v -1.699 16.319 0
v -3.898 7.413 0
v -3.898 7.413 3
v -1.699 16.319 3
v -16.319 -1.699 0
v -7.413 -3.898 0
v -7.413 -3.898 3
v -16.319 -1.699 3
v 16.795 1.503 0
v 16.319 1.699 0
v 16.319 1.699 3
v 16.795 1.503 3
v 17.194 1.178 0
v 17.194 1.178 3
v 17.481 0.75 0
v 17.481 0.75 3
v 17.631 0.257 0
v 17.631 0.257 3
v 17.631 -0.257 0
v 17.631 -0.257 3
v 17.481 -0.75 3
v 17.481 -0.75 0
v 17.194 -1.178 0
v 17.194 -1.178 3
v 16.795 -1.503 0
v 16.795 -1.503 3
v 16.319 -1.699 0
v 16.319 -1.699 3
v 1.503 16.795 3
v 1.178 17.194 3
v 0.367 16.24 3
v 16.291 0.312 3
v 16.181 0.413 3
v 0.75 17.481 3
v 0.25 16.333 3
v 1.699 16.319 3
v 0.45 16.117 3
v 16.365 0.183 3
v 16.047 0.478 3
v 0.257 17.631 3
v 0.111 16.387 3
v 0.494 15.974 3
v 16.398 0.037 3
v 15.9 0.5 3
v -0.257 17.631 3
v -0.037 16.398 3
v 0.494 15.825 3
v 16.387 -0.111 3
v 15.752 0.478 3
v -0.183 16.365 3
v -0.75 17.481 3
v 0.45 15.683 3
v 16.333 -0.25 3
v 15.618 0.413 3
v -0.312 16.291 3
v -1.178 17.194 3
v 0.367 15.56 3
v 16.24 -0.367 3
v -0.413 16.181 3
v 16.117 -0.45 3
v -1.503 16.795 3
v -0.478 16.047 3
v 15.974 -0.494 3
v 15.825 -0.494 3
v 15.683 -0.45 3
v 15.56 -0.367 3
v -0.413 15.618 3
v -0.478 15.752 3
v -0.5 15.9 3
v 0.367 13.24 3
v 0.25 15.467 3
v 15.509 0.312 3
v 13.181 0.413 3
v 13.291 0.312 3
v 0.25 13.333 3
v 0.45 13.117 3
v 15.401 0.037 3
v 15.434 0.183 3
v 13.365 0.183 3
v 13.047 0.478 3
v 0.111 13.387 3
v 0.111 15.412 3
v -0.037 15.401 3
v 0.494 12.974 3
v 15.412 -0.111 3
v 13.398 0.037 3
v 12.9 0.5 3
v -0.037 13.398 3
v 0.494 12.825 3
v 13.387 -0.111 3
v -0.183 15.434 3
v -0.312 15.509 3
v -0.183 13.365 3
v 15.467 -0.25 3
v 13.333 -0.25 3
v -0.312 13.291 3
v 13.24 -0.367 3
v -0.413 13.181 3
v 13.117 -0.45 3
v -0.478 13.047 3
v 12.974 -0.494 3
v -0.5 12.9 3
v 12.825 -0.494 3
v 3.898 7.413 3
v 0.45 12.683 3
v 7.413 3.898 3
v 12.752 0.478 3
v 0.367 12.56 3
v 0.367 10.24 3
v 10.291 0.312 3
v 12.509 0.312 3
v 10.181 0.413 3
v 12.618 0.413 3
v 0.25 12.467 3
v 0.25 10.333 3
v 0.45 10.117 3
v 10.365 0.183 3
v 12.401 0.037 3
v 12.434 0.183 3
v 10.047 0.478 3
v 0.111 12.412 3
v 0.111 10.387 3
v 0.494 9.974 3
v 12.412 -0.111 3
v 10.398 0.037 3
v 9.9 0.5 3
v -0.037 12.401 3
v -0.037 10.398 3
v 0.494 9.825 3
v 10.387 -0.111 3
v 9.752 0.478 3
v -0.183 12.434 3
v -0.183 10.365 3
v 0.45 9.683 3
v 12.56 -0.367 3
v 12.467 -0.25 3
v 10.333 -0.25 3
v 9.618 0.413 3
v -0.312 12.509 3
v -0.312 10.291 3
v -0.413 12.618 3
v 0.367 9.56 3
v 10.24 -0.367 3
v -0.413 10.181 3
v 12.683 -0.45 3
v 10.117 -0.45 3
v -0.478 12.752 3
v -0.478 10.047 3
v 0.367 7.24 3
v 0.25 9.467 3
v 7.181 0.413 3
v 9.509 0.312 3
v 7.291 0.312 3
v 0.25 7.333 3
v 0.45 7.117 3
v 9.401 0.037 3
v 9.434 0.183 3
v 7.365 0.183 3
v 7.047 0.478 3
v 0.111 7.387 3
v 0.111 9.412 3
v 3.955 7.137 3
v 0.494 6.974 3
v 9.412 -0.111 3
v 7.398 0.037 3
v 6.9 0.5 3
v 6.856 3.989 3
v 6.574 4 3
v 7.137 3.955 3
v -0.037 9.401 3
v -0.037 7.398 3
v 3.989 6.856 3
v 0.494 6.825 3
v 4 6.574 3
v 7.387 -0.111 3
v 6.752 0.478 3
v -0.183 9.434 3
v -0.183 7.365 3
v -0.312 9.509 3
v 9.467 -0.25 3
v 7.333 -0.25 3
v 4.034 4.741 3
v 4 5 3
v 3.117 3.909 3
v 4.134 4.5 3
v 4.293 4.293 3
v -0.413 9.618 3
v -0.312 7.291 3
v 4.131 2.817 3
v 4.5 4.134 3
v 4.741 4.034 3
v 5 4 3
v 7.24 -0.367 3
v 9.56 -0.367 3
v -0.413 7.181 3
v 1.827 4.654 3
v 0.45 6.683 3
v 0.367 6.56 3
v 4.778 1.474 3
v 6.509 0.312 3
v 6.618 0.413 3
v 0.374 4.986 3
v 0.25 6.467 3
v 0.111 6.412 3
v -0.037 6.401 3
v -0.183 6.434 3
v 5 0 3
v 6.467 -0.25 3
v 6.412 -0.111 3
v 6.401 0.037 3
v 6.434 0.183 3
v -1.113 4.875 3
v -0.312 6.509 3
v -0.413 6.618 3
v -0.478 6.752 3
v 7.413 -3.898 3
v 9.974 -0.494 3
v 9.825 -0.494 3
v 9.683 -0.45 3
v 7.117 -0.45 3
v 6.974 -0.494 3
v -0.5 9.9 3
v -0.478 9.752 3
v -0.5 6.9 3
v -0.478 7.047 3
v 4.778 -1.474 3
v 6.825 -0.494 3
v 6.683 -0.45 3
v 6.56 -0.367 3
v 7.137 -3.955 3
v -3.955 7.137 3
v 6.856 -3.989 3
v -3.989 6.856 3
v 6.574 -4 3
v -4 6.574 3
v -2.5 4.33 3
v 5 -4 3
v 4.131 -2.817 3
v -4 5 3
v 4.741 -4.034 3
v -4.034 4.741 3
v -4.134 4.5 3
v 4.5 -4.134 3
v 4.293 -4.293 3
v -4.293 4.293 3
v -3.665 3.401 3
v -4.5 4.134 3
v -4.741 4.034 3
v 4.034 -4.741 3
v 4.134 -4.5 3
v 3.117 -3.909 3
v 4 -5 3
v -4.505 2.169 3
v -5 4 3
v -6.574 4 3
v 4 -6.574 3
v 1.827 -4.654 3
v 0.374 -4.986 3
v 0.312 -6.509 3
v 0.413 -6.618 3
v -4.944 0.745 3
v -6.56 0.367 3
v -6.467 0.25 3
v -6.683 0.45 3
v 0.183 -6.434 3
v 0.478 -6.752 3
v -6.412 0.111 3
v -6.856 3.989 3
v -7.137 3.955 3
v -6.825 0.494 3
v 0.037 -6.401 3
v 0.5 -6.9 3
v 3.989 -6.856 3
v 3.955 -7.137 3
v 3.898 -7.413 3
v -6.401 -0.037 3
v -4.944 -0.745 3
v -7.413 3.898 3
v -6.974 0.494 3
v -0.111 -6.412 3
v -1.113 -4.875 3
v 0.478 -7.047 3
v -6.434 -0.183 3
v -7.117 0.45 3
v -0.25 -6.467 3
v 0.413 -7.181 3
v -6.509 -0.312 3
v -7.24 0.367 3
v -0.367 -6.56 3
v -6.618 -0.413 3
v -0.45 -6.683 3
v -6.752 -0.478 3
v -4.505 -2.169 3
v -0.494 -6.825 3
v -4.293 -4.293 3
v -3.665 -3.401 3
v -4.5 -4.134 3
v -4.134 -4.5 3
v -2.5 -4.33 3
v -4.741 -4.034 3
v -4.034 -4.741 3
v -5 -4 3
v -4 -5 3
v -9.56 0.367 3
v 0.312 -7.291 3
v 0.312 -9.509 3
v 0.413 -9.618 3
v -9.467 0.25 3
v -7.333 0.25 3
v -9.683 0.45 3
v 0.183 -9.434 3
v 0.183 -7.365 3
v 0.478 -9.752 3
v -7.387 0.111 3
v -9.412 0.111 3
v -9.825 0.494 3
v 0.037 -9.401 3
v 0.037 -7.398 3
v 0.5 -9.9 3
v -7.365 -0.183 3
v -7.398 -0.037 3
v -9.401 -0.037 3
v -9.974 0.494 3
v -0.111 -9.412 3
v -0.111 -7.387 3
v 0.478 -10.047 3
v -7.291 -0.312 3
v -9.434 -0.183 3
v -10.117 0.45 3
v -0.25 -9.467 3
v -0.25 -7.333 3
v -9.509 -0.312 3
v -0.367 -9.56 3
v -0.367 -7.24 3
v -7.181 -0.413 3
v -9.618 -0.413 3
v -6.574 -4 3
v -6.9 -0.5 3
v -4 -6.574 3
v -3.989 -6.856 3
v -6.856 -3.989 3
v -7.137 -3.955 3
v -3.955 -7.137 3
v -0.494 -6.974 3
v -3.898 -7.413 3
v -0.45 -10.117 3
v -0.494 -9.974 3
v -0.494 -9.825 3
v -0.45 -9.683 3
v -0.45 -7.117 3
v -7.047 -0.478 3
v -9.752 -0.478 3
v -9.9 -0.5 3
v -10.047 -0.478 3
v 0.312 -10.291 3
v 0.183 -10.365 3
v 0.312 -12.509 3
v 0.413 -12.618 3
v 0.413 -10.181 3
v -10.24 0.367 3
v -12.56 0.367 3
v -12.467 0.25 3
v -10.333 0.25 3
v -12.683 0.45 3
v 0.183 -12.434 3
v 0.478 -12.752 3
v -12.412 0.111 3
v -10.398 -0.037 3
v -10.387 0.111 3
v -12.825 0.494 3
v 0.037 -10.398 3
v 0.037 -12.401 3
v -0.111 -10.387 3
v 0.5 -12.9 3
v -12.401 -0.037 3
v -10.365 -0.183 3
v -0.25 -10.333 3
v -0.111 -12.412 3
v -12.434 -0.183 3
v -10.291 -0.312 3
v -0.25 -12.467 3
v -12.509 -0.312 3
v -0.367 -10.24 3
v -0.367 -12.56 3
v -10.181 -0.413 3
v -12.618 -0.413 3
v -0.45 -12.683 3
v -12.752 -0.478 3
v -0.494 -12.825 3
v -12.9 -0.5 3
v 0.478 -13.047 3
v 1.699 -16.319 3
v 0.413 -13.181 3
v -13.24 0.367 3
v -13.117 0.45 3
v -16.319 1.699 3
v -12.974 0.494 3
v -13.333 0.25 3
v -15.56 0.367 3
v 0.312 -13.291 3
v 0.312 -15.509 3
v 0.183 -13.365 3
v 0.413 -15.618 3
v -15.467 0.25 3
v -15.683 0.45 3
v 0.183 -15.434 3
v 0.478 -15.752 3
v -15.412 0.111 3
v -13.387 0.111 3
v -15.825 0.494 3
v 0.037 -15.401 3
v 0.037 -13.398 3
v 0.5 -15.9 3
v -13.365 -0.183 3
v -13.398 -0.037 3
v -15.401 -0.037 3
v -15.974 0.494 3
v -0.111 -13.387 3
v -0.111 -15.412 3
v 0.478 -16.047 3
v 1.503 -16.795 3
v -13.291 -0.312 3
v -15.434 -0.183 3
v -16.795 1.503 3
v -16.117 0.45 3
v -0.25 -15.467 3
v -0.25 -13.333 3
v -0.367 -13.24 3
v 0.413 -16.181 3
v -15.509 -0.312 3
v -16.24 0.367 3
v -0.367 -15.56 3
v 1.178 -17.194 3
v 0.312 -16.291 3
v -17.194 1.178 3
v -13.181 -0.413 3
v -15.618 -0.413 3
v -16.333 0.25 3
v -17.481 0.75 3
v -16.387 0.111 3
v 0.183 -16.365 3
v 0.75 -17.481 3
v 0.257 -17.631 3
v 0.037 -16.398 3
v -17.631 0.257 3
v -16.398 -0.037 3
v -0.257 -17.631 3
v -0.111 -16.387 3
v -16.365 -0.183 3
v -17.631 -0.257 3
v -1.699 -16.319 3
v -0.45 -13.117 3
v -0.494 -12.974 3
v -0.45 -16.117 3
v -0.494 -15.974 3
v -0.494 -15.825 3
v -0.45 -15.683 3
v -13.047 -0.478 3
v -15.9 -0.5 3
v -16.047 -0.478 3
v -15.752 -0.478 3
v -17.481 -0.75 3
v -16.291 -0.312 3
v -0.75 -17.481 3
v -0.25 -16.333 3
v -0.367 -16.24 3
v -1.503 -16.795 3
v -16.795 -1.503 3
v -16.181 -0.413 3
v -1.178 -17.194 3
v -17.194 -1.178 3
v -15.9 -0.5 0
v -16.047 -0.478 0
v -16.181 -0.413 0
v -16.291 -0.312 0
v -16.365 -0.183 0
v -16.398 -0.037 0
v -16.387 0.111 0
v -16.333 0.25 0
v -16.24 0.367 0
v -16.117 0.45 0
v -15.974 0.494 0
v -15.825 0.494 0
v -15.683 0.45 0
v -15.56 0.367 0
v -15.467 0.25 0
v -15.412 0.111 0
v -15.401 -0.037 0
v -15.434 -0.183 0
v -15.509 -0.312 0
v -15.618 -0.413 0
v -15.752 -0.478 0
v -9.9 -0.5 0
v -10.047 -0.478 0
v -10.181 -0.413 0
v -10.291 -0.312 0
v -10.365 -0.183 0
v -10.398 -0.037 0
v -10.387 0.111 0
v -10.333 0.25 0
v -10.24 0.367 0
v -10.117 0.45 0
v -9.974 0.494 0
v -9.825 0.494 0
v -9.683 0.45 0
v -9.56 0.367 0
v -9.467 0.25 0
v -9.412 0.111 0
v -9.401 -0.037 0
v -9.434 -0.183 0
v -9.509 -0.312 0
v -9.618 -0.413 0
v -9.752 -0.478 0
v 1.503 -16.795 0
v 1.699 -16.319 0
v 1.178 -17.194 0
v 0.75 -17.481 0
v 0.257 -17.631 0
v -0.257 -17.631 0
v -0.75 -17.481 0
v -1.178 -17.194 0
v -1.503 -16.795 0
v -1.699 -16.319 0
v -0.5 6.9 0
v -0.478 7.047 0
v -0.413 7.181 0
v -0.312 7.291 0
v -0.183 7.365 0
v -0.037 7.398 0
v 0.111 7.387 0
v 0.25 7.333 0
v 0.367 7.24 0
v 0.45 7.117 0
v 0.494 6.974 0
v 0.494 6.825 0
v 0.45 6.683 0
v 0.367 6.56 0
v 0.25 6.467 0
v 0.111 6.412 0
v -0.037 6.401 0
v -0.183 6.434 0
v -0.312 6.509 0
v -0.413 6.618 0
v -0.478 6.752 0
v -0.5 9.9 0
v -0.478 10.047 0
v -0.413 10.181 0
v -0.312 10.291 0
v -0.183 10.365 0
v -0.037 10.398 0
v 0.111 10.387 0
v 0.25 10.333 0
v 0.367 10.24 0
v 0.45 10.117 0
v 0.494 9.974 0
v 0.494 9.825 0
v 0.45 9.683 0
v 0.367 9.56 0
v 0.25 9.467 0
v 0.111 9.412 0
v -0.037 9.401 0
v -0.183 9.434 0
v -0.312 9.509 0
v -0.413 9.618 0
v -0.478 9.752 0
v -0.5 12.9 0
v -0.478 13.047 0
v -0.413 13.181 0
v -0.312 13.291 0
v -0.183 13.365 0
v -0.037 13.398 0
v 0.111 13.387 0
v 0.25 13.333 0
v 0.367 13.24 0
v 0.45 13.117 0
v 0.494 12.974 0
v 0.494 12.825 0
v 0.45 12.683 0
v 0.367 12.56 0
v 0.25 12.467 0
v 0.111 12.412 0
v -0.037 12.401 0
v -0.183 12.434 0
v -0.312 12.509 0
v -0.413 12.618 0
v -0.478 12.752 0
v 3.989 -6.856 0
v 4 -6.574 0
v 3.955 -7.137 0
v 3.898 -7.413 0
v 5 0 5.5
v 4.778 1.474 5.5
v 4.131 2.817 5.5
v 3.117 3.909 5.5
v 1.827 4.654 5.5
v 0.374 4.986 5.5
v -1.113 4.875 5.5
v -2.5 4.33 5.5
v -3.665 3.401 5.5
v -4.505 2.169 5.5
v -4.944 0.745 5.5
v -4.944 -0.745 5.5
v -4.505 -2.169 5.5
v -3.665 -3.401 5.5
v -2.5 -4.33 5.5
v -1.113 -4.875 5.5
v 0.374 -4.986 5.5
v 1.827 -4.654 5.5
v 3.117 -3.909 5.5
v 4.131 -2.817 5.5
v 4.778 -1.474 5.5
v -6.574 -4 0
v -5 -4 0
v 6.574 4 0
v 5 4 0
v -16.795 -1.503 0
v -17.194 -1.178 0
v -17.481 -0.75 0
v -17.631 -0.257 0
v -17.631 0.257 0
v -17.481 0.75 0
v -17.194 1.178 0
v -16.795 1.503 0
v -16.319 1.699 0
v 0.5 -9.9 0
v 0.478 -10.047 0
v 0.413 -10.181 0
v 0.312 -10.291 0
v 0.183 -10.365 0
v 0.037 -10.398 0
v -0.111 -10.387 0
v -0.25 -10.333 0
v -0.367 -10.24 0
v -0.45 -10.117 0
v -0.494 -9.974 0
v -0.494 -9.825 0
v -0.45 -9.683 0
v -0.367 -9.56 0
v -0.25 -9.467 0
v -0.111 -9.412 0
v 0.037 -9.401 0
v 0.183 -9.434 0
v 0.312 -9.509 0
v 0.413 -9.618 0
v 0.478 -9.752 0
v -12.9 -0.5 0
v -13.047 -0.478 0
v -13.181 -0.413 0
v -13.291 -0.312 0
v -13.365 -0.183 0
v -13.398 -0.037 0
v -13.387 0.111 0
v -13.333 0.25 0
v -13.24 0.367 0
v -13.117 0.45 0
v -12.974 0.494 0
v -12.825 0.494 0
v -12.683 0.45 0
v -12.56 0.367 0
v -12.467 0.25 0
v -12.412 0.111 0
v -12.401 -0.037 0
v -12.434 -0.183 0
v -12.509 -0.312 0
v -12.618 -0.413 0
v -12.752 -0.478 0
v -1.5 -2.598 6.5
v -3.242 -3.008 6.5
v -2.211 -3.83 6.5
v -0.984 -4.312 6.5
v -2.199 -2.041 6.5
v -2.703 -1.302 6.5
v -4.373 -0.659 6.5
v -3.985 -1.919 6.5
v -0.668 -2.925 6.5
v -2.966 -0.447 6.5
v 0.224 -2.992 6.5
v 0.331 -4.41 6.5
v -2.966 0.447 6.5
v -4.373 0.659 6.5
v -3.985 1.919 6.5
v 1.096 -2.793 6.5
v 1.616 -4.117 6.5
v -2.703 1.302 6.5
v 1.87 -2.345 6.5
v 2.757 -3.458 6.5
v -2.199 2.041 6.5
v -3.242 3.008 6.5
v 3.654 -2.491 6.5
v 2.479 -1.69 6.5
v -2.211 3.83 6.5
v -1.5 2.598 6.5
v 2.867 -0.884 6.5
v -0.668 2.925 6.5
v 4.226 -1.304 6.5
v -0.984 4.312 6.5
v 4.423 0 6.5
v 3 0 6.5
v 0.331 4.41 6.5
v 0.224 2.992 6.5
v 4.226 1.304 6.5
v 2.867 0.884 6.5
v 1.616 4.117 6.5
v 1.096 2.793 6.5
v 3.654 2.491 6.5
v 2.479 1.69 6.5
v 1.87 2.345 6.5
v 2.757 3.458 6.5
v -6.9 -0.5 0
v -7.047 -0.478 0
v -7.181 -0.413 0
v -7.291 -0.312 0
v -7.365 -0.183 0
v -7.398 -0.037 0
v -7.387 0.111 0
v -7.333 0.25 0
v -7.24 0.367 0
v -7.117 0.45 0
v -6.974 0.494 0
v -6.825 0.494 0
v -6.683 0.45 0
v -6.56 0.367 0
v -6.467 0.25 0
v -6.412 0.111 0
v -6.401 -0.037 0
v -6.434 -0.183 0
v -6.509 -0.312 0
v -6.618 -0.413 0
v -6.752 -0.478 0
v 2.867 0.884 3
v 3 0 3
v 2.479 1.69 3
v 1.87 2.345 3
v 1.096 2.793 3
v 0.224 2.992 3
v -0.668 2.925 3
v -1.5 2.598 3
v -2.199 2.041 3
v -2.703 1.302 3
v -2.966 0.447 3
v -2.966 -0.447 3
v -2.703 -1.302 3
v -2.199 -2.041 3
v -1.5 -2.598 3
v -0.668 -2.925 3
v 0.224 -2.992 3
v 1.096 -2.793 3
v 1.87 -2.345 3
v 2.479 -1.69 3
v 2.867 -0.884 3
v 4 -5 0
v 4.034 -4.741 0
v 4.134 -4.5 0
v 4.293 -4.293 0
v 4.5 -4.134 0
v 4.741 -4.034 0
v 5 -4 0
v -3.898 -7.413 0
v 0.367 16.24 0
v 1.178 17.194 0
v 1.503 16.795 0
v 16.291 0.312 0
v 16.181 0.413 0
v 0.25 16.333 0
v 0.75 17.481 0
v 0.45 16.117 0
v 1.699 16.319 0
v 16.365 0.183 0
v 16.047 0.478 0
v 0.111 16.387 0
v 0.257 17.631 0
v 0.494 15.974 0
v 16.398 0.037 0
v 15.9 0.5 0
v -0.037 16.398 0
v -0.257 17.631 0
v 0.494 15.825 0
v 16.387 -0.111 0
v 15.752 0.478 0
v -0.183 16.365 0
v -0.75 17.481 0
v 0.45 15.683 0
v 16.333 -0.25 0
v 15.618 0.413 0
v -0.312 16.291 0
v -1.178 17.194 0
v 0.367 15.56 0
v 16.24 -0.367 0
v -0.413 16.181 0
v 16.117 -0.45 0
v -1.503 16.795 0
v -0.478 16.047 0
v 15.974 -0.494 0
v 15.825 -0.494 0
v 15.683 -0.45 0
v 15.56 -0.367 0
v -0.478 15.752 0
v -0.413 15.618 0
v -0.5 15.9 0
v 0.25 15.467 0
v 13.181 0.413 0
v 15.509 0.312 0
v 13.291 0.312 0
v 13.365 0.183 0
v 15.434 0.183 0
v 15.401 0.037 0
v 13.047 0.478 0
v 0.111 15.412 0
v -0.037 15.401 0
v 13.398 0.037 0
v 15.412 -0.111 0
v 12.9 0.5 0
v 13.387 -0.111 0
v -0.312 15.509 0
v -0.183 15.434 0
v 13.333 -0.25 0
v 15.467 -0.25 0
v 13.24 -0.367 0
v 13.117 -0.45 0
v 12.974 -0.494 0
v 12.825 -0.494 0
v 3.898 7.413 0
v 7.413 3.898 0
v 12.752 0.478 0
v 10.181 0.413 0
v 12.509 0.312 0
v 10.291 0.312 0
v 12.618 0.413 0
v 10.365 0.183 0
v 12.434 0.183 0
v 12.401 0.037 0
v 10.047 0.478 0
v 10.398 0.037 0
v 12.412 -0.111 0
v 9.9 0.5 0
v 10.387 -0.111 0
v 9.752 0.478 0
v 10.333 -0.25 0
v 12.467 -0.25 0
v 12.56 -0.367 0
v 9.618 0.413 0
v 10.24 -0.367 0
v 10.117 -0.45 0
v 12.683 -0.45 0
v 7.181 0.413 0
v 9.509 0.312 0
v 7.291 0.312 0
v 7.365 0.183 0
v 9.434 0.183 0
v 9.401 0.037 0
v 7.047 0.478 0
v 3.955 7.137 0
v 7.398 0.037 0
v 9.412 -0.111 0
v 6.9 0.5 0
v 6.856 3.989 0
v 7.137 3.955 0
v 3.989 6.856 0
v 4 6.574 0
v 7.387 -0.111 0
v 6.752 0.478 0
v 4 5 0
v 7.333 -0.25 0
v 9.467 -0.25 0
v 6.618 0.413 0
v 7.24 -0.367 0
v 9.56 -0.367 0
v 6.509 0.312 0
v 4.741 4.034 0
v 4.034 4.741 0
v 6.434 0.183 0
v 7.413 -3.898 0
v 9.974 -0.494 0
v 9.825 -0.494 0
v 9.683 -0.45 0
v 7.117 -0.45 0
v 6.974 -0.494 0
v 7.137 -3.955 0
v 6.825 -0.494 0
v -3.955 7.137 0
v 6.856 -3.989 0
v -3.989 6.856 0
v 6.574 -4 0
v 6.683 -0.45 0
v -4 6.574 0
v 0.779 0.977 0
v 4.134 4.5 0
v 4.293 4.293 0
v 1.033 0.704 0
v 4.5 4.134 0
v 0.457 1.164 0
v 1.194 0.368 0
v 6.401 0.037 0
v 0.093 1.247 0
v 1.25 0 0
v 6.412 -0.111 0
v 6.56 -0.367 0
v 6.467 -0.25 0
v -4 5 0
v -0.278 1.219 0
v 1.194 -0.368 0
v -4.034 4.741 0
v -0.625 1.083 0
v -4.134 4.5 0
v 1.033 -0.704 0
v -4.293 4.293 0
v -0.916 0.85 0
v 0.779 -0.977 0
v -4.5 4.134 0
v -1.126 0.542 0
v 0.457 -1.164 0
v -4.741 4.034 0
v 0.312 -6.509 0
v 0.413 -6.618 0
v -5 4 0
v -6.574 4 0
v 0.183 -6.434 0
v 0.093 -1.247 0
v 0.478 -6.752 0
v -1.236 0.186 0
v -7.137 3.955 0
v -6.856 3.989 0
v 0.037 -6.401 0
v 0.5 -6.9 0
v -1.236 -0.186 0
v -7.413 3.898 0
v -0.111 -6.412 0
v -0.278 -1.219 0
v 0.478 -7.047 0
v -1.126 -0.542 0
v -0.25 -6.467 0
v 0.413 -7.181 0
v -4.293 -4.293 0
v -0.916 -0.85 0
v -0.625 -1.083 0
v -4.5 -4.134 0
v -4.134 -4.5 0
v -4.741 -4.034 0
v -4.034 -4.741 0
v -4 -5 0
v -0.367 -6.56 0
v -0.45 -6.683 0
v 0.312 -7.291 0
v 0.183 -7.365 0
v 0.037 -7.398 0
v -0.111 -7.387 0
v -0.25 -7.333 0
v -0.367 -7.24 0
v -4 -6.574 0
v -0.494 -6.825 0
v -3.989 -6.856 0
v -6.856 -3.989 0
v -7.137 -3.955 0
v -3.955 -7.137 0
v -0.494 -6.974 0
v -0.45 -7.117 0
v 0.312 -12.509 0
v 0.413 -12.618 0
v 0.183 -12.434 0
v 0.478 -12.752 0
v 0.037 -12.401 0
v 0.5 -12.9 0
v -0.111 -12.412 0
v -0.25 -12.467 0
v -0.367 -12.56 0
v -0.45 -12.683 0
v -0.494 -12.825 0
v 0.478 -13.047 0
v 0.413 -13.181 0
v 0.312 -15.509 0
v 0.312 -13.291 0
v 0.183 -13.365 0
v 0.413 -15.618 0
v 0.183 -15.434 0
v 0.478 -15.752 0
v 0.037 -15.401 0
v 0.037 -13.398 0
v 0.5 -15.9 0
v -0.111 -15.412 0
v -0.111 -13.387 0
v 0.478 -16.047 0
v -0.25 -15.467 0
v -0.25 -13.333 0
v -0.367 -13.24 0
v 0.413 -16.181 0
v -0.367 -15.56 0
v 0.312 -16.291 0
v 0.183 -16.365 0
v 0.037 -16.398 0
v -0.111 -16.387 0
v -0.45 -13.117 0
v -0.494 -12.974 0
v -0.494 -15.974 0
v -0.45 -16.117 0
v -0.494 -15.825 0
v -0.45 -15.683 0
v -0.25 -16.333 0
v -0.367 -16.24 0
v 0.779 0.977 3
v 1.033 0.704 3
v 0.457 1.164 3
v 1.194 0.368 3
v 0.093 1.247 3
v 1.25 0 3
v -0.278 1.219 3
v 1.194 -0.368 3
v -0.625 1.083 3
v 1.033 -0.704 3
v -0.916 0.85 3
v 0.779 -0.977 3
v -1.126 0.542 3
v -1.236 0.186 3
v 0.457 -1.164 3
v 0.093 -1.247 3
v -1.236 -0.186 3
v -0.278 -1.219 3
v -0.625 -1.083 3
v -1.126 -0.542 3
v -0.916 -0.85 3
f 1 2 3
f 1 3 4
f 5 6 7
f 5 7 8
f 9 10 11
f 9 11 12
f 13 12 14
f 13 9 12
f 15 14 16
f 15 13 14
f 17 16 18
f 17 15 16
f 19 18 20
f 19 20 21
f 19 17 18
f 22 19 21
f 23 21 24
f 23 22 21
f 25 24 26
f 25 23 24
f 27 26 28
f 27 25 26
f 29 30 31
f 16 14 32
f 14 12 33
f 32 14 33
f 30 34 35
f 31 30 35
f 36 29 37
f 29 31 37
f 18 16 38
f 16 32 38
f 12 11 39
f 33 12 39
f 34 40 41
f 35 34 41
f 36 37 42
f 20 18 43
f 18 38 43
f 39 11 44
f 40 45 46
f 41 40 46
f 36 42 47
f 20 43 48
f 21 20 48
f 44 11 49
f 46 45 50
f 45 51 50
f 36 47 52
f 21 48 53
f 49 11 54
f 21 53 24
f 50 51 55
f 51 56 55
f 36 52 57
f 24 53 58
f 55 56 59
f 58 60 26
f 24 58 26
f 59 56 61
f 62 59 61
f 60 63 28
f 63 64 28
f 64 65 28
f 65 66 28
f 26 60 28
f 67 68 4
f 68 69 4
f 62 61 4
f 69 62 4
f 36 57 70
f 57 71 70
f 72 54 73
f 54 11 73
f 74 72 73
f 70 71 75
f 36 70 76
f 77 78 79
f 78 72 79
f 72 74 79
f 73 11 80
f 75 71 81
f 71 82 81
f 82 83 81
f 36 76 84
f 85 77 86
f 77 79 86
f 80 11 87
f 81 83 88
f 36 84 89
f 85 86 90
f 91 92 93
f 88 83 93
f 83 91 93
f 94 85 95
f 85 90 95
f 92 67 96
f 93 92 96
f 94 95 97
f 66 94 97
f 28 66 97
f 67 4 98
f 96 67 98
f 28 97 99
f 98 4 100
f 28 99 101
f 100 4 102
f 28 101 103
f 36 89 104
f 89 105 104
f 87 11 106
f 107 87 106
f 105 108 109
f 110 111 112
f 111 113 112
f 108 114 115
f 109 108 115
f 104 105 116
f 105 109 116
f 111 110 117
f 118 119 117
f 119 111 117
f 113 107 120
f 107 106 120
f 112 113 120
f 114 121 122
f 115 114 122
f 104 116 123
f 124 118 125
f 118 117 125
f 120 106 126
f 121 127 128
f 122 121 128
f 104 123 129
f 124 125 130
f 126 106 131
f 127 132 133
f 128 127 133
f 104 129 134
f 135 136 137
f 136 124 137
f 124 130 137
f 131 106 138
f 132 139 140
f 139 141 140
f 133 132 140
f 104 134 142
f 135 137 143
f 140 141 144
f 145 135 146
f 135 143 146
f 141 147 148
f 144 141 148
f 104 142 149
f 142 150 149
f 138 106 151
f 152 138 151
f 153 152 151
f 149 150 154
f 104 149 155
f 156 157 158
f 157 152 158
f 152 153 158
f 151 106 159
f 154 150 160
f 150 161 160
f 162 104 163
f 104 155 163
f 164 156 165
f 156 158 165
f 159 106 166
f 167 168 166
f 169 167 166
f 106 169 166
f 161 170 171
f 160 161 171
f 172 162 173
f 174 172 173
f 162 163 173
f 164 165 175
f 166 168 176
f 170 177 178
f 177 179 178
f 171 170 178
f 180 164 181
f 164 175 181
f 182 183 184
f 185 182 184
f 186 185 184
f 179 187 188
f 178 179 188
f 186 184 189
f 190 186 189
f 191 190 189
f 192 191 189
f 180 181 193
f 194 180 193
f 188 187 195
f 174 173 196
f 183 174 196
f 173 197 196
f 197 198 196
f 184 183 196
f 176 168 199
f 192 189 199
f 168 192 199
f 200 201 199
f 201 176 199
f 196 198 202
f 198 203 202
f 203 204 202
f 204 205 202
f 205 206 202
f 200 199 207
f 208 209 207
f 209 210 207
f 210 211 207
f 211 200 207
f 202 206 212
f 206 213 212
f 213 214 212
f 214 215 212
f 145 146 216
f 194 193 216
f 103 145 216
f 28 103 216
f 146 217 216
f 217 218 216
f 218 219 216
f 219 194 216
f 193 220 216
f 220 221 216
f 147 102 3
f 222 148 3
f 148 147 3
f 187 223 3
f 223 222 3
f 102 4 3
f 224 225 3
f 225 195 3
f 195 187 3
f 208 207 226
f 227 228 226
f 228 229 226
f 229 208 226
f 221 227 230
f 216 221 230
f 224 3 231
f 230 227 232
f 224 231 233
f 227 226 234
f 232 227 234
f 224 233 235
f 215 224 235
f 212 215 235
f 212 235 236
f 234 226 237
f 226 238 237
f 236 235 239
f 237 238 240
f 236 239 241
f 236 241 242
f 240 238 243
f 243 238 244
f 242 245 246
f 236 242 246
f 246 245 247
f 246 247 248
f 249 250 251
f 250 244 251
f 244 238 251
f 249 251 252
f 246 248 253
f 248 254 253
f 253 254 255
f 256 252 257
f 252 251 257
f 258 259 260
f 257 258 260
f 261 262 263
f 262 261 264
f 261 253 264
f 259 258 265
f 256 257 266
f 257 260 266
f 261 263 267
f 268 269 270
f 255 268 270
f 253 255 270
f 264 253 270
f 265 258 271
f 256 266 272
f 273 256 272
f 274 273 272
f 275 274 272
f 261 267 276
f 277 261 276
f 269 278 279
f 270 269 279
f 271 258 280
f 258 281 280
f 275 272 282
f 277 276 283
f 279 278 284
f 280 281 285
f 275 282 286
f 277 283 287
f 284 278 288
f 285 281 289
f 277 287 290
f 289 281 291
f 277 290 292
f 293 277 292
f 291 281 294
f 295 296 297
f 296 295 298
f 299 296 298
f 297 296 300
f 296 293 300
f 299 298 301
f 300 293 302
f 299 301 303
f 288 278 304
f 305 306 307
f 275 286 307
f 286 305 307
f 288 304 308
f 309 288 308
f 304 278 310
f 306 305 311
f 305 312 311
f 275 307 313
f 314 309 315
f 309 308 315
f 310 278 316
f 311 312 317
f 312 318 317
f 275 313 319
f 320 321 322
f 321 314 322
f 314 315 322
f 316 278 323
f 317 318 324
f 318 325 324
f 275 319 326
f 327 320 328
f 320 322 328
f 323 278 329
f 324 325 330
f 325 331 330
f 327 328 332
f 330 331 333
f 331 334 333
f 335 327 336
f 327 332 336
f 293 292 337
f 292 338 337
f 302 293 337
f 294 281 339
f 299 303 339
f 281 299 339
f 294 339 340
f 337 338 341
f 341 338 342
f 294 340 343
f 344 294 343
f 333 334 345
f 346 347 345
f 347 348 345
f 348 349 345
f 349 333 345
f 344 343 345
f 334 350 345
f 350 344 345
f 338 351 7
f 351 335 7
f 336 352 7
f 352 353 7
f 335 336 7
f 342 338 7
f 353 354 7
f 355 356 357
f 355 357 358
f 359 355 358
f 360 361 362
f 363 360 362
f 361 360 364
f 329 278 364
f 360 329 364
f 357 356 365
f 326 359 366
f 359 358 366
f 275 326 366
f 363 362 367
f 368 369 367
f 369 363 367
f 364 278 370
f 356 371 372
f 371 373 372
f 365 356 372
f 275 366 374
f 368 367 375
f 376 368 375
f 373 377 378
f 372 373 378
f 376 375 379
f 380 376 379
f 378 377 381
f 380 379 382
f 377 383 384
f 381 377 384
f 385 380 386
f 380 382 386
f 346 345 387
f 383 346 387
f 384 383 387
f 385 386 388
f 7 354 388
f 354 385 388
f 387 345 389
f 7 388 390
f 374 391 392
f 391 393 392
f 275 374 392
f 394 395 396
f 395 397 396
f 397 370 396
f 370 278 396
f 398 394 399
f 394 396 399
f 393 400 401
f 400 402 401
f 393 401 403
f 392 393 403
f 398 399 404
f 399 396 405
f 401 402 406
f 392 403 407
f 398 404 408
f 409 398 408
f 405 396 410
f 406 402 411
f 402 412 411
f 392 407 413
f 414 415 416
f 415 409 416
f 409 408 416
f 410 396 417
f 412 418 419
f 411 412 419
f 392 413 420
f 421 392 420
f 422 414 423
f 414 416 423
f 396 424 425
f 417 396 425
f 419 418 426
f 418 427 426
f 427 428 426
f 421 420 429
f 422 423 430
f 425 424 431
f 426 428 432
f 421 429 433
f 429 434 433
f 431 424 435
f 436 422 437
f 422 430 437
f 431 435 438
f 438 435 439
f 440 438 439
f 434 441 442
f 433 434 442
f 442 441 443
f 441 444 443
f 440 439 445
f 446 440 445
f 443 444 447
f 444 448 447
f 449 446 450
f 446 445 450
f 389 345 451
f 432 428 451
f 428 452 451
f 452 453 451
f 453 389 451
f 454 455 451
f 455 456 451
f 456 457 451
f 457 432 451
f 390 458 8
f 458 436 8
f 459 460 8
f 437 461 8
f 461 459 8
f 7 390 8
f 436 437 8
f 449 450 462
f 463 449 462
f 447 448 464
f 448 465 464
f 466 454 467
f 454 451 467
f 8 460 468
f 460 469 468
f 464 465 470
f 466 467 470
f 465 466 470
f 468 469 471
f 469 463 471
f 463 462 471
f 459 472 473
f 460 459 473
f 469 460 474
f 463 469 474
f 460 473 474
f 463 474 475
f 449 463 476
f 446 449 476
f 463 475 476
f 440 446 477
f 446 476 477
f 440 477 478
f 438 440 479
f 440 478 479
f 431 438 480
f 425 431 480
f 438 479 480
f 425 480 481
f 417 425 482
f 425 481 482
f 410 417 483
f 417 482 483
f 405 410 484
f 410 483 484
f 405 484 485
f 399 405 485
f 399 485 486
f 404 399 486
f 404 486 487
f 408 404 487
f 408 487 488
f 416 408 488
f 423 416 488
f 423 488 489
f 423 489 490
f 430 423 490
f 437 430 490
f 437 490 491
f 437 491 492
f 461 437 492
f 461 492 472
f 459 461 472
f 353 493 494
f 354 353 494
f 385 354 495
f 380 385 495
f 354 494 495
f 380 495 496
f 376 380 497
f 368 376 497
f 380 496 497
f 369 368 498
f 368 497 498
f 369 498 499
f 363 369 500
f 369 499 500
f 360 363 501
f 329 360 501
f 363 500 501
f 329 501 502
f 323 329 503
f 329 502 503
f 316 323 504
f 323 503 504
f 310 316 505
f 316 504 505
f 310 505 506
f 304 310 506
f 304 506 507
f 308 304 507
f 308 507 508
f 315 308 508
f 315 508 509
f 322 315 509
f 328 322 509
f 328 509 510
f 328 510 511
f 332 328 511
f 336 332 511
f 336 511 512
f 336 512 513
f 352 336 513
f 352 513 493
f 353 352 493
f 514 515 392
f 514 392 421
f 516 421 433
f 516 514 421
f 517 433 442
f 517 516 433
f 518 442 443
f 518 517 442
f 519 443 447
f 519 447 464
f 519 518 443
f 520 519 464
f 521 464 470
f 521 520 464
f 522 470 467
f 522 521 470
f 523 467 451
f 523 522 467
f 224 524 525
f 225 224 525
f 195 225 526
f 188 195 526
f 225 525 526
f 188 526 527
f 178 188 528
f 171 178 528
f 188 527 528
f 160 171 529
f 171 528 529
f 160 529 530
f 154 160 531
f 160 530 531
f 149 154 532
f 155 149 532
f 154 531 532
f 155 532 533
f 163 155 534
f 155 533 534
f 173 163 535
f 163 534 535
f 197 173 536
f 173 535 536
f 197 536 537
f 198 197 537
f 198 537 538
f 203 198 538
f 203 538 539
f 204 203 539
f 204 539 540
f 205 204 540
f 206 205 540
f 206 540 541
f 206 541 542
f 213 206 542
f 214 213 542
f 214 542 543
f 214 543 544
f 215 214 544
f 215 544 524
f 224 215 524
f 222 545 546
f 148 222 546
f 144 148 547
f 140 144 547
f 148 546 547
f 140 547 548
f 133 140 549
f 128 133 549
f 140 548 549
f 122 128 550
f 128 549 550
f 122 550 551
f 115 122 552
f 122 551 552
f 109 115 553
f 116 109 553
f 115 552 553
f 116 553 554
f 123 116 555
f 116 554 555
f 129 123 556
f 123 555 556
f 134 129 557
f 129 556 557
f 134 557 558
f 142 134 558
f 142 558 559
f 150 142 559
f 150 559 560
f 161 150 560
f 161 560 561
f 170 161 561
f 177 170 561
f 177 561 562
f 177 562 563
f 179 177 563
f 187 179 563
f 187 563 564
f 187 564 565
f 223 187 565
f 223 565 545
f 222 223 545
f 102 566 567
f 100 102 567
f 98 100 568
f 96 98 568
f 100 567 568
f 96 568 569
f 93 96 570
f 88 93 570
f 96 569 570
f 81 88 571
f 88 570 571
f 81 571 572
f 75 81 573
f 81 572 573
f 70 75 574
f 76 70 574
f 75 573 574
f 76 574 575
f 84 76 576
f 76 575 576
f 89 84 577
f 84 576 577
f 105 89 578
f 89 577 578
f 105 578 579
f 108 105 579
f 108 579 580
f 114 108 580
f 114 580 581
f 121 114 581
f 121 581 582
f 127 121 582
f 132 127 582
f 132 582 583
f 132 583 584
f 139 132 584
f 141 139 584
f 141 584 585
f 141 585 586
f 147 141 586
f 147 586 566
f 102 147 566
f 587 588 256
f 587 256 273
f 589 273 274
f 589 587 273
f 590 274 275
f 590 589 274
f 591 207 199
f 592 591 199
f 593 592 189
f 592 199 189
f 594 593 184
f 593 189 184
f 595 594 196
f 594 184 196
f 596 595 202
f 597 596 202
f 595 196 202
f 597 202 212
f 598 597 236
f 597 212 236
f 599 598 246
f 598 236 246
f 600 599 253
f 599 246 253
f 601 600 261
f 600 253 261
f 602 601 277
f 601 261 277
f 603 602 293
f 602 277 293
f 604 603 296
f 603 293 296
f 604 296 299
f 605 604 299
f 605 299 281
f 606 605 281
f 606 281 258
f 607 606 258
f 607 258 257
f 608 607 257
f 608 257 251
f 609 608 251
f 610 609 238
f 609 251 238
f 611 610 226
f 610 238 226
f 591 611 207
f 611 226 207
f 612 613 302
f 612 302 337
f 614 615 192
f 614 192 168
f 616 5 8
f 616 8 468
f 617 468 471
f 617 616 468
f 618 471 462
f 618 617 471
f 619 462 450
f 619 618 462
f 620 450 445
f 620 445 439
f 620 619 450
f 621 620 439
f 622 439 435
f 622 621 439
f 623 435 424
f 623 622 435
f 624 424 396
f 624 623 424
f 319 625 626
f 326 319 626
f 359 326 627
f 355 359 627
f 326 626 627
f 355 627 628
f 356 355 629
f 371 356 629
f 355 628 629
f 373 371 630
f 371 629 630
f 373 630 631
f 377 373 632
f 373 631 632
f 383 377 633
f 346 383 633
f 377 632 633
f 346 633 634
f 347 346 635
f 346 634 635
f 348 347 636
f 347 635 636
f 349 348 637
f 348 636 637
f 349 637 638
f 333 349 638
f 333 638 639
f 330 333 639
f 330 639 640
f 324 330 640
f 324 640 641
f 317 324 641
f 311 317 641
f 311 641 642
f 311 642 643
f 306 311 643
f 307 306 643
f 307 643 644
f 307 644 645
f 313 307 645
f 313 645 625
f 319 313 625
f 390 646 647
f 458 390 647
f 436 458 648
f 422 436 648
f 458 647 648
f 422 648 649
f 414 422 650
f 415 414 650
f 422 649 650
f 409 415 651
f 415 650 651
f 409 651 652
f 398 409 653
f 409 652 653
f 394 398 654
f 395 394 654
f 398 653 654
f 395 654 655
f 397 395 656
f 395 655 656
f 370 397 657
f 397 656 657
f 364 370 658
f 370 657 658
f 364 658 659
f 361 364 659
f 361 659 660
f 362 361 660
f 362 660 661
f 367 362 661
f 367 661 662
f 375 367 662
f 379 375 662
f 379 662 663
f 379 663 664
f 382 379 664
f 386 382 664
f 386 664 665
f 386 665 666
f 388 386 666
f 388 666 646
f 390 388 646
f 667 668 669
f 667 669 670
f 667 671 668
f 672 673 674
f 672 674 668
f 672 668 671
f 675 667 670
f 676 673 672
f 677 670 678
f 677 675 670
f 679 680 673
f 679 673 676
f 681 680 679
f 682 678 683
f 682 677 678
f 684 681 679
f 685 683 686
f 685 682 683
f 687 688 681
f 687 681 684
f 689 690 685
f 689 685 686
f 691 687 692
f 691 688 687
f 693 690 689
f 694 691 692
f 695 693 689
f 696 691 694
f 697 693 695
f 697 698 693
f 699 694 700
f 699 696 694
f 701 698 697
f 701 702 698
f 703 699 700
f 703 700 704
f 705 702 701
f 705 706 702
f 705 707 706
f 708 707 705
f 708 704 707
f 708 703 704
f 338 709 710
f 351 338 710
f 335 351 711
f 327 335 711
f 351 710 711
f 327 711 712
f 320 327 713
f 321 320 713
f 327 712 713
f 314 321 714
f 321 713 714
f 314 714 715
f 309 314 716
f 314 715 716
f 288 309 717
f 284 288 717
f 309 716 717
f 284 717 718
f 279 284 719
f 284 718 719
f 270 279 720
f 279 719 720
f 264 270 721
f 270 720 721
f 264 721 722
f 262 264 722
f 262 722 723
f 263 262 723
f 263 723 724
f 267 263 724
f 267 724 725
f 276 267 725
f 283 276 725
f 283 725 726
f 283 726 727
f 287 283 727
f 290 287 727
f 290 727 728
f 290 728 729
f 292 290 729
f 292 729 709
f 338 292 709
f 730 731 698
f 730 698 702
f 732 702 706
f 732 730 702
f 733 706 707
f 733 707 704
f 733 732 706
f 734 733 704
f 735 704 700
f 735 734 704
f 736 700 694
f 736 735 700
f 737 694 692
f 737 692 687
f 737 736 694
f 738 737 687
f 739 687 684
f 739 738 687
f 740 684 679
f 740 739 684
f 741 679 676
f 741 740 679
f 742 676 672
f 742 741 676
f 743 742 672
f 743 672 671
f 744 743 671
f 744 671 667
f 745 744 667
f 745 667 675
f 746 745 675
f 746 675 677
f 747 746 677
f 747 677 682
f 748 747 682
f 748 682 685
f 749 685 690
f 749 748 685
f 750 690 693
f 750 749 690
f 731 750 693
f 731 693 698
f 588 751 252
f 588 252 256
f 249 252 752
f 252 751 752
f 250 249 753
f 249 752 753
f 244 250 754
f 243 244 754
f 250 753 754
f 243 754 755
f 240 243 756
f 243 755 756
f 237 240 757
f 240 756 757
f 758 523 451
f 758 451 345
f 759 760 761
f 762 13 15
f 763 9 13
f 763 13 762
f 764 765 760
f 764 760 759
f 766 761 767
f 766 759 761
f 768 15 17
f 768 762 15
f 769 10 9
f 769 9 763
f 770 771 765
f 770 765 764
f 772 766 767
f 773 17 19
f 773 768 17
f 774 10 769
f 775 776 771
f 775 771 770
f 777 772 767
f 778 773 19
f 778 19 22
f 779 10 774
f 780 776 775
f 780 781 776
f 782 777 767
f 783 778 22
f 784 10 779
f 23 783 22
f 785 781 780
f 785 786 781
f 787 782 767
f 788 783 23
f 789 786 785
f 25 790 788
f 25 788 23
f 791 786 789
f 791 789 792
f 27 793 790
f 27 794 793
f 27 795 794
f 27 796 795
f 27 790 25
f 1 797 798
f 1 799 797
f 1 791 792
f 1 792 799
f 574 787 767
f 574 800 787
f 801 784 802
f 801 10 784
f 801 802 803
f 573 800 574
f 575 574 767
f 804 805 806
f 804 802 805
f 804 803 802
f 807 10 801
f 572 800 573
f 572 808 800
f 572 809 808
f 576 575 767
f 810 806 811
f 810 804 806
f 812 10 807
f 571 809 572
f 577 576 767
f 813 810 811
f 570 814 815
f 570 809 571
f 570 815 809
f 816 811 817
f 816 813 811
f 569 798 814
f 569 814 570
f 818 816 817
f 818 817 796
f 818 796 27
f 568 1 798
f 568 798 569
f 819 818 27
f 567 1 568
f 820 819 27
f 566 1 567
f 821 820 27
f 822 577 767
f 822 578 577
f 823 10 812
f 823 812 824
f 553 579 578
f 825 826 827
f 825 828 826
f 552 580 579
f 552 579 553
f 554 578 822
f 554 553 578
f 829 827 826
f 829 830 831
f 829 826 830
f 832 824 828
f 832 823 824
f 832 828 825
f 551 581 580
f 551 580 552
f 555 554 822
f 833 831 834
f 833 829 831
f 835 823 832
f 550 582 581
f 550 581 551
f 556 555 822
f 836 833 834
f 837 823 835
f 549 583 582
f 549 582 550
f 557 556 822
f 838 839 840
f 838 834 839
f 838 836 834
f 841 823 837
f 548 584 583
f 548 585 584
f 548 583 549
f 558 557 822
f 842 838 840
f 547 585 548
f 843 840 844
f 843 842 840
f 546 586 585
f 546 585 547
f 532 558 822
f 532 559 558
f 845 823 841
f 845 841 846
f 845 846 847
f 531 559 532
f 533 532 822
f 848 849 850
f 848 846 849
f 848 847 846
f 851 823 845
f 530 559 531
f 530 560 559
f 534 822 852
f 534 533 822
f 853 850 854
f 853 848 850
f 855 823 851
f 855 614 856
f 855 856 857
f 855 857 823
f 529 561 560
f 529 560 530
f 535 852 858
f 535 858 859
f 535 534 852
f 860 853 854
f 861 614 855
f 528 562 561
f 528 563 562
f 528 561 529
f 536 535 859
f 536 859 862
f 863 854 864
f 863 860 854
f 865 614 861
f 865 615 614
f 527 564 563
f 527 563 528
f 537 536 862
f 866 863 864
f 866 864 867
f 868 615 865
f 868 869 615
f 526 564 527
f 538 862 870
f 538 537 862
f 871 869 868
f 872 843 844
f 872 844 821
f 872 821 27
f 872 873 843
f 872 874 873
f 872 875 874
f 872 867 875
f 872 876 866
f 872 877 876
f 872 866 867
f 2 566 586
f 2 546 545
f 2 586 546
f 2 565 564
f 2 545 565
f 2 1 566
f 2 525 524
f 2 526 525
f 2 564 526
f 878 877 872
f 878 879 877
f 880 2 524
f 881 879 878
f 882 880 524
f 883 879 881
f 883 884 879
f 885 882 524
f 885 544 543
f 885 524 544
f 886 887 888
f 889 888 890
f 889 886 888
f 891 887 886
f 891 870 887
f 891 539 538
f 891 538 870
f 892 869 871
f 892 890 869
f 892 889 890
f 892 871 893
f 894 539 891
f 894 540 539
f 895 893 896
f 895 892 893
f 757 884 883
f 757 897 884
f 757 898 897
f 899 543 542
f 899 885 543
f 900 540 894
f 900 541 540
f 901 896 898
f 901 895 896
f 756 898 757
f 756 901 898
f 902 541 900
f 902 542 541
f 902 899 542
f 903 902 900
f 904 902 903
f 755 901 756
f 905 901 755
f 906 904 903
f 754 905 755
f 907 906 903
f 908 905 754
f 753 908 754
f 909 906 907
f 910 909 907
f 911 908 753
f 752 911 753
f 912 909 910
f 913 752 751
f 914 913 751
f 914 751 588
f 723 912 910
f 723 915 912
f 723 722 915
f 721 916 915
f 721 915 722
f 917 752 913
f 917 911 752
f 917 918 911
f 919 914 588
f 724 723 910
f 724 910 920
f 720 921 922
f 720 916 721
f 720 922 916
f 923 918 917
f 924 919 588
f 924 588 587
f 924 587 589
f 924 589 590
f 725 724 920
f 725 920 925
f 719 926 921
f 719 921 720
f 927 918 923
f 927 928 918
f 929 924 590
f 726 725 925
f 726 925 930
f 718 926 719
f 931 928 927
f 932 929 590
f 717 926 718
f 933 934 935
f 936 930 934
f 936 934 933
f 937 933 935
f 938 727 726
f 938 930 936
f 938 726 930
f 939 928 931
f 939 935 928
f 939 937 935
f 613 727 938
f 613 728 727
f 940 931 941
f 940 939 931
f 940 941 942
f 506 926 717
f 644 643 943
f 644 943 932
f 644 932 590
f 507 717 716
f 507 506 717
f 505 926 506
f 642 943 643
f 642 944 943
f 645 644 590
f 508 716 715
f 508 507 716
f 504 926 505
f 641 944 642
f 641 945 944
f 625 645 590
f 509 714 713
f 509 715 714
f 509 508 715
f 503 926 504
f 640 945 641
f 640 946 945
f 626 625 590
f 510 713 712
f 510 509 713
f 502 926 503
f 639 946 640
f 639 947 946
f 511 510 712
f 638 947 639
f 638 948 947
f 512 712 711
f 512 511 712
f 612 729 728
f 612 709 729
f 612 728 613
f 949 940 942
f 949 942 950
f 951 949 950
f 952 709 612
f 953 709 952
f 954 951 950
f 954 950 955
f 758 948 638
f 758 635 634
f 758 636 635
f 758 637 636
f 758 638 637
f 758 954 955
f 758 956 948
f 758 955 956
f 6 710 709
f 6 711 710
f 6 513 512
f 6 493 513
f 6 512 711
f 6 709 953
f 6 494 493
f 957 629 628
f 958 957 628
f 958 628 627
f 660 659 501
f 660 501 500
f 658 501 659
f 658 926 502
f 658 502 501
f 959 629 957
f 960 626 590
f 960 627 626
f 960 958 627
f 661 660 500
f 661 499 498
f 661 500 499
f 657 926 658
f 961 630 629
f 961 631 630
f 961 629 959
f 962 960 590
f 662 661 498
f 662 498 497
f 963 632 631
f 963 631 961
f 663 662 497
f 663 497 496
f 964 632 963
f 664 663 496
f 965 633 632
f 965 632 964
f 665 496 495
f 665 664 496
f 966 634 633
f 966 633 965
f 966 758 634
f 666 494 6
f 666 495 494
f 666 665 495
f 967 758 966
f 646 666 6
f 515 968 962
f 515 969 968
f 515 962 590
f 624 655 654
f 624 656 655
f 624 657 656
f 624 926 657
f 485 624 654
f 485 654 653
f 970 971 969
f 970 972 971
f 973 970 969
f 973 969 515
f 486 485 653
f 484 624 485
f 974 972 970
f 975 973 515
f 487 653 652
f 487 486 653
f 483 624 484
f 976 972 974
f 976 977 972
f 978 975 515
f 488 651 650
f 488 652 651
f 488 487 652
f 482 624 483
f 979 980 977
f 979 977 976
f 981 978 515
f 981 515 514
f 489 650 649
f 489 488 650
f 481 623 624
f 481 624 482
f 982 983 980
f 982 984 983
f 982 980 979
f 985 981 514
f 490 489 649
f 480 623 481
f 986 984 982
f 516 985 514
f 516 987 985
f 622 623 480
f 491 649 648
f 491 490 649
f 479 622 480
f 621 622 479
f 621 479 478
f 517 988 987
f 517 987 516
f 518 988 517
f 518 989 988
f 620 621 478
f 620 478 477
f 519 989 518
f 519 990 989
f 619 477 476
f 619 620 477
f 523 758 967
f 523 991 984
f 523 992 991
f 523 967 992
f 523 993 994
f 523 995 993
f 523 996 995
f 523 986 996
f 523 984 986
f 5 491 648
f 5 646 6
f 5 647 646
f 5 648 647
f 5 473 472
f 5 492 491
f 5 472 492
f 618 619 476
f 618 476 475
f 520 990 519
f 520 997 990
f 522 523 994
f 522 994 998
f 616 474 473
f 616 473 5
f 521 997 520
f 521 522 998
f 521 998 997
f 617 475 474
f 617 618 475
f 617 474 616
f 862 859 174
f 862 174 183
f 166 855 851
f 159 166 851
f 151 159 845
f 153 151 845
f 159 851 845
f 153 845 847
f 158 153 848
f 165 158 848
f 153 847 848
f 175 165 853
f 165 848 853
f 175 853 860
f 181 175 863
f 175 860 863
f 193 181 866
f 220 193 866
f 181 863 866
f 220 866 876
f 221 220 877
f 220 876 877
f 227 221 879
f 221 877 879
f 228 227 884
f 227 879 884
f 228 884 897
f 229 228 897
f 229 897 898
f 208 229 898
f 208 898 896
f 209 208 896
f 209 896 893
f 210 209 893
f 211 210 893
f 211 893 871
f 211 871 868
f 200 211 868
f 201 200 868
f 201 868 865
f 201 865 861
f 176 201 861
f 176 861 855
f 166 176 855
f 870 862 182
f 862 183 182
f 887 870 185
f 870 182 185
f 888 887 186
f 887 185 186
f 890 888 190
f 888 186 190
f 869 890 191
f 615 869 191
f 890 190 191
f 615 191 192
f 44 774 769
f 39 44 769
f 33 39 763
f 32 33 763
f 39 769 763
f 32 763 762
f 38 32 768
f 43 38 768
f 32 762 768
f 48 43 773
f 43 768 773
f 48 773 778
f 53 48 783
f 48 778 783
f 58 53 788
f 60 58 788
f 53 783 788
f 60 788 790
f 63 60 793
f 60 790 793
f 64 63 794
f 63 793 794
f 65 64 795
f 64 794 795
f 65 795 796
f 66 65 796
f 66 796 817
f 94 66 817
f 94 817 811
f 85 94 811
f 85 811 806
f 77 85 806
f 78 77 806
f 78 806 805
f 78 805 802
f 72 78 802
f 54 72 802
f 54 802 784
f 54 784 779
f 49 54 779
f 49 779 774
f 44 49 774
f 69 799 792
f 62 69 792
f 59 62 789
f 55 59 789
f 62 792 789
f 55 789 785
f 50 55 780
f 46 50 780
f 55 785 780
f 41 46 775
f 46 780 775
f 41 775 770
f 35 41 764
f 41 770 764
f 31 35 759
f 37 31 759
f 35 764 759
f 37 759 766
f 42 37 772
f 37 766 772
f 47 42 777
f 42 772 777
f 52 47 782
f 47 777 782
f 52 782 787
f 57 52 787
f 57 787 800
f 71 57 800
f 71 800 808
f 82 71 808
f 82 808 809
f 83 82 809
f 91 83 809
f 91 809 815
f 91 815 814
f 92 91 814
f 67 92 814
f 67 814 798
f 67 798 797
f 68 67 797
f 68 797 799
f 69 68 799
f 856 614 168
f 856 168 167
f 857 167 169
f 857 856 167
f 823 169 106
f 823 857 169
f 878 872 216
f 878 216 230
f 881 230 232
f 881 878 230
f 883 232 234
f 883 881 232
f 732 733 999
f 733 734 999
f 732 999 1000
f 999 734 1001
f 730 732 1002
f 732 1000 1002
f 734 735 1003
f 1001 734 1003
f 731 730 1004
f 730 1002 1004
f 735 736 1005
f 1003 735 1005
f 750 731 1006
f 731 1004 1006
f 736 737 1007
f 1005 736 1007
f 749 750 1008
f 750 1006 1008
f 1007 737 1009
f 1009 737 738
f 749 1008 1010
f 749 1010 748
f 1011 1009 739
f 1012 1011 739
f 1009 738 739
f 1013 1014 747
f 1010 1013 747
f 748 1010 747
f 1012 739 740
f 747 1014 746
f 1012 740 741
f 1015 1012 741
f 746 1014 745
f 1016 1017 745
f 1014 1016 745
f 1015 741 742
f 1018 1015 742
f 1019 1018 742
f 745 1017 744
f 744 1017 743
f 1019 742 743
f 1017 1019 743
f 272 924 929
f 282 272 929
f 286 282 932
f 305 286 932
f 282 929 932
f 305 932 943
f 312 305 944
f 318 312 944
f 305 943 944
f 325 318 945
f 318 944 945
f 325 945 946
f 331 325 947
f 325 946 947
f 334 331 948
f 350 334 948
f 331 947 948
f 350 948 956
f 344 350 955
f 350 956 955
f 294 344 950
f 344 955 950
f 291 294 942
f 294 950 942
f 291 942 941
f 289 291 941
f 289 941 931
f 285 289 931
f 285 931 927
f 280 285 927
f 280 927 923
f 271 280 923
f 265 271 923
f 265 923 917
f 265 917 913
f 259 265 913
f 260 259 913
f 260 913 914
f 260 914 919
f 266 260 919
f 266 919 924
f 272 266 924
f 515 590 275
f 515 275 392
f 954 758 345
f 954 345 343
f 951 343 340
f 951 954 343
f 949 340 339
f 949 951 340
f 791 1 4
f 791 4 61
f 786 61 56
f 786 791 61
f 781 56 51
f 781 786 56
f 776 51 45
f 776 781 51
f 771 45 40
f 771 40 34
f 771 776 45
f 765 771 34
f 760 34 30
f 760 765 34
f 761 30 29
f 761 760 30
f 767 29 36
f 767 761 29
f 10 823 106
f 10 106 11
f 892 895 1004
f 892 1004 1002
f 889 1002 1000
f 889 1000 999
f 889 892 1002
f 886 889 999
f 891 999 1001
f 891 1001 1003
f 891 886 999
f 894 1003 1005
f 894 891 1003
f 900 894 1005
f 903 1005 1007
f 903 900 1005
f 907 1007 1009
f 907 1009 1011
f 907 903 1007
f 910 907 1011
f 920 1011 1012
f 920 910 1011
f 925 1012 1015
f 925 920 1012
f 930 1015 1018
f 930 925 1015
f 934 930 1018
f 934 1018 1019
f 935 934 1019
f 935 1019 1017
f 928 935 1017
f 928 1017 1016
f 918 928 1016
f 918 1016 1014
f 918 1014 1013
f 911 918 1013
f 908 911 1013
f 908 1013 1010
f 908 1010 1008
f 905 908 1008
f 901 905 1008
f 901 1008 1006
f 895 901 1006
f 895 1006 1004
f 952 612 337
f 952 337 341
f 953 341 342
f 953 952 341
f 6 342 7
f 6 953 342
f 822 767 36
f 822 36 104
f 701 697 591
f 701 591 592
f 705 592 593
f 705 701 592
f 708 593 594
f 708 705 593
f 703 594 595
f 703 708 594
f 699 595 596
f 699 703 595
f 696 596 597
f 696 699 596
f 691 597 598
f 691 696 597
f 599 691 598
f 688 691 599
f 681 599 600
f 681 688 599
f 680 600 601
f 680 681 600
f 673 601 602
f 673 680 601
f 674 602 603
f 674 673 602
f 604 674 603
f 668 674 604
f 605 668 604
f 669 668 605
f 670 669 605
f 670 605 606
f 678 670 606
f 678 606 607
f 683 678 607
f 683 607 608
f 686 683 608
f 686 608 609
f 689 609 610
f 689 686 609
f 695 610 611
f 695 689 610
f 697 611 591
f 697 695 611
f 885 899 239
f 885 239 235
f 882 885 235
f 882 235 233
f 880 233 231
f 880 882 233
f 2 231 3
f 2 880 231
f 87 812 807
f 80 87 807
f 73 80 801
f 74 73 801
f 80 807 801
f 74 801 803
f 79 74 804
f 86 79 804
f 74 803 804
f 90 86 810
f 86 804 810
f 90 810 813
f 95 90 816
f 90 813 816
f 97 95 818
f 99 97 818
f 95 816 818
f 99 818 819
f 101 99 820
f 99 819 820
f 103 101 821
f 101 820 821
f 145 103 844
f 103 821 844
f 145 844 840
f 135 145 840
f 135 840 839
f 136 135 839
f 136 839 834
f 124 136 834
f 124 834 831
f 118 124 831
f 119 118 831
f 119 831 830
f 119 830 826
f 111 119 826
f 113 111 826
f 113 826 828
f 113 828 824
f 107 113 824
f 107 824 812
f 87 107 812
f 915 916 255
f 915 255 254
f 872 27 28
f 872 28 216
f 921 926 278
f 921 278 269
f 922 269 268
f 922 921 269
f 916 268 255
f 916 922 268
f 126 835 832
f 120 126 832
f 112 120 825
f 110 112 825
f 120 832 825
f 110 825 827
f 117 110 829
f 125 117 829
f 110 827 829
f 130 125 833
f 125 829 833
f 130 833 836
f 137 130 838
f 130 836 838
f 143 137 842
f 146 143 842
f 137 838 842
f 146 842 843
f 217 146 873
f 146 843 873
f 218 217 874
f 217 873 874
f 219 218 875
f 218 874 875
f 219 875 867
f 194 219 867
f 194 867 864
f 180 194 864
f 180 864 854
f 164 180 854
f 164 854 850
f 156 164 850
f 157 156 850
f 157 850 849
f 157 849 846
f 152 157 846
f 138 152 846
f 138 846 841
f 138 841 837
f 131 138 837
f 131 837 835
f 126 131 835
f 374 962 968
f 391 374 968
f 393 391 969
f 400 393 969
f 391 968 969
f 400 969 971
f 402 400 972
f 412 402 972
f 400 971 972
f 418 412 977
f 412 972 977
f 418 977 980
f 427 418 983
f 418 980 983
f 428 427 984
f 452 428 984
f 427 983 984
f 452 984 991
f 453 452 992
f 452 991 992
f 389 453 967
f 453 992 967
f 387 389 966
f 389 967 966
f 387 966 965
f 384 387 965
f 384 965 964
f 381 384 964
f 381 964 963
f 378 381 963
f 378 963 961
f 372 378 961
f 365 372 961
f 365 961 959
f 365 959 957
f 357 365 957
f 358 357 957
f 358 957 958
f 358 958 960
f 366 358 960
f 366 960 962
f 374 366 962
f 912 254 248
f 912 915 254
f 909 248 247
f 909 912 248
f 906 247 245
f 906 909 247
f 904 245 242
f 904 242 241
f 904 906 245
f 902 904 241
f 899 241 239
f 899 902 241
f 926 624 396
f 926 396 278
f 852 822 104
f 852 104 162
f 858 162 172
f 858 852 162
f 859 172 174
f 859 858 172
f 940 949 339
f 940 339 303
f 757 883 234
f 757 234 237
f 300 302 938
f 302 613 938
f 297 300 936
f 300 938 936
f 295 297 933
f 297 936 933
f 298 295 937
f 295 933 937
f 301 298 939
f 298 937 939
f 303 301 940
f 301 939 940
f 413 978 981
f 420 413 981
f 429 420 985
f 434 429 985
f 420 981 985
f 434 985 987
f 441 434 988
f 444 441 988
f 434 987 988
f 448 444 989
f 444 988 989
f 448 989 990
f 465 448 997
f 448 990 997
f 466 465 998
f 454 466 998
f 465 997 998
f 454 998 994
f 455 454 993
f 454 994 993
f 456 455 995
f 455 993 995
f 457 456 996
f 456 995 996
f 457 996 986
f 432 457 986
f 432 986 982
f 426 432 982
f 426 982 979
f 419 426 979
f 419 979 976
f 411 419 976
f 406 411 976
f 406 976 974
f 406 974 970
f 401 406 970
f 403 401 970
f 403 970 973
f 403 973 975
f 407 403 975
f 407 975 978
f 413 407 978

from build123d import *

# Parameters (mm, degrees)
BOSS_EXTRUDE1_DEPTH   = 3
F_1_0MM_DOWEL_HOLE1_D = 1
LPATTERN1_COUNT       = 4
LPATTERN1_PITCH       = 3
CIRPATTERN1_COUNT     = 4
CIRPATTERN1_COPY_1_D  = 1
CIRPATTERN1_COPY_2_D  = 1
CIRPATTERN1_COPY_3_D  = 1
CIRPATTERN1_COPY_4_D  = 1
CIRPATTERN1_COPY_5_D  = 1
CIRPATTERN1_COPY_6_D  = 1
CIRPATTERN1_COPY_7_D  = 1
CIRPATTERN1_COPY_8_D  = 1
CIRPATTERN1_COPY_9_D  = 1
SKETCH6_R             = 5
SKETCH6_R_2           = 3
BOSS_EXTRUDE2_DEPTH   = 3.5
CHAMFER1_SIZE         = 1
CHAMFER1_SIZE2        = 0.577350269
FILLET1_R             = 1


with BuildPart() as part:
    # Sketch1 → Boss-Extrude1 (new body)
    with BuildSketch(Plane.XY):
        with BuildLine():
            Line((-4, 0), (-4, 6.574293681))
            ThreePointArc((-4, 6.574293681), (-3.974394349, 6.996885575), (-3.897952052, 7.413294188))
            Line((-3.897952052, 7.413294188), (-1.698976026, 16.319147094))
            ThreePointArc((-1.698976026, 16.319147094), (0, 17.649646841), (1.698976026, 16.319147094))
            Line((1.698976026, 16.319147094), (3.897952052, 7.413294188))
            ThreePointArc((3.897952052, 7.413294188), (3.974394349, 6.996885575), (4, 6.574293681))
            Line((4, 6.574293681), (4, 0))
            Line((4, 0), (1.25, 0))
            ThreePointArc((1.25, 0), (0, 1.25), (-1.25, 0))
            Line((-1.25, 0), (-4, 0))
        make_face()
    boss_extrude1 = extrude(amount=BOSS_EXTRUDE1_DEPTH)

    # Ø1.0mm Dowel Hole1 (through all)
    with Locations(Plane.XY.offset(3)):
        with Locations((0, 15.899646841)):
            f_1_0mm_dowel_hole1 = Hole(F_1_0MM_DOWEL_HOLE1_D / 2)

    # LPattern1: Ø1.0mm Dowel Hole1 ×4
    with Locations(*[(0, -i * LPATTERN1_PITCH, 0) for i in range(1, LPATTERN1_COUNT)]):
        add(f_1_0mm_dowel_hole1, mode=Mode.SUBTRACT)

    # CirPattern1: Boss-Extrude1, Ø1.0mm Dowel Hole1 ×4 about axis
    cirpattern1_axis = Axis((0, 0, 0), (0, 0, 1))
    add([boss_extrude1.rotate(cirpattern1_axis, i * 360 / CIRPATTERN1_COUNT) for i in range(1, CIRPATTERN1_COUNT)])
    add([f_1_0mm_dowel_hole1.rotate(cirpattern1_axis, i * 360 / CIRPATTERN1_COUNT) for i in range(1, CIRPATTERN1_COUNT)], mode=Mode.SUBTRACT)

    # CirPattern1 copy 1 (through all)
    with Locations(Plane(origin=(3, 0, 3), x_dir=(0, 1, 0), z_dir=(0, 0, 1))):
        with Locations((0, 15.899646841)):
            Hole(CIRPATTERN1_COPY_1_D / 2)

    # CirPattern1 copy 2 (through all)
    with Locations(Plane(origin=(0, 3, 3), x_dir=(-1, 0, 0), z_dir=(0, 0, 1))):
        with Locations((0, 15.899646841)):
            Hole(CIRPATTERN1_COPY_2_D / 2)

    # CirPattern1 copy 3 (through all)
    with Locations(Plane(origin=(-3, 0, 3), x_dir=(0, -1, 0), z_dir=(0, 0, 1))):
        with Locations((0, 15.899646841)):
            Hole(CIRPATTERN1_COPY_3_D / 2)

    # CirPattern1 copy 4 (through all)
    with Locations(Plane(origin=(6, 0, 3), x_dir=(0, 1, 0), z_dir=(0, 0, 1))):
        with Locations((0, 15.899646841)):
            Hole(CIRPATTERN1_COPY_4_D / 2)

    # CirPattern1 copy 5 (through all)
    with Locations(Plane(origin=(0, 6, 3), x_dir=(-1, 0, 0), z_dir=(0, 0, 1))):
        with Locations((0, 15.899646841)):
            Hole(CIRPATTERN1_COPY_5_D / 2)

    # CirPattern1 copy 6 (through all)
    with Locations(Plane(origin=(-6, 0, 3), x_dir=(0, -1, 0), z_dir=(0, 0, 1))):
        with Locations((0, 15.899646841)):
            Hole(CIRPATTERN1_COPY_6_D / 2)

    # CirPattern1 copy 7 (through all)
    with Locations(Plane(origin=(9, 0, 3), x_dir=(0, 1, 0), z_dir=(0, 0, 1))):
        with Locations((0, 15.899646841)):
            Hole(CIRPATTERN1_COPY_7_D / 2)

    # CirPattern1 copy 8 (through all)
    with Locations(Plane(origin=(0, 9, 3), x_dir=(-1, 0, 0), z_dir=(0, 0, 1))):
        with Locations((0, 15.899646841)):
            Hole(CIRPATTERN1_COPY_8_D / 2)

    # CirPattern1 copy 9 (through all)
    with Locations(Plane(origin=(-9, 0, 3), x_dir=(0, -1, 0), z_dir=(0, 0, 1))):
        with Locations((0, 15.899646841)):
            Hole(CIRPATTERN1_COPY_9_D / 2)

    # Sketch6 → Boss-Extrude2 (add)
    with BuildSketch(Plane.XY.offset(3)):
        Circle(SKETCH6_R)
        Circle(SKETCH6_R_2, mode=Mode.SUBTRACT)
    extrude(amount=BOSS_EXTRUDE2_DEPTH)

    # Chamfer1
    chamfer1_edges = [part.edges().sort_by_distance(p)[0] for p in [
        (-5, 0, 6.5),
    ]]
    chamfer1_side = [part.faces().sort_by_distance(p)[0] for p in [
        (-5, 0, 4.75),
    ]]
    chamfer(chamfer1_edges, length=CHAMFER1_SIZE, length2=CHAMFER1_SIZE2, reference=chamfer1_side[0])

    # Fillet1
    fillet1_edges = [part.edges().sort_by_distance(p)[0] for p in [
        (4, 4, 1.5),
        (-4, 4, 1.5),
        (-4, -4, 1.5),
        (4, -4, 1.5),
    ]]
    fillet(fillet1_edges, radius=FILLET1_R)


solid = part.part
